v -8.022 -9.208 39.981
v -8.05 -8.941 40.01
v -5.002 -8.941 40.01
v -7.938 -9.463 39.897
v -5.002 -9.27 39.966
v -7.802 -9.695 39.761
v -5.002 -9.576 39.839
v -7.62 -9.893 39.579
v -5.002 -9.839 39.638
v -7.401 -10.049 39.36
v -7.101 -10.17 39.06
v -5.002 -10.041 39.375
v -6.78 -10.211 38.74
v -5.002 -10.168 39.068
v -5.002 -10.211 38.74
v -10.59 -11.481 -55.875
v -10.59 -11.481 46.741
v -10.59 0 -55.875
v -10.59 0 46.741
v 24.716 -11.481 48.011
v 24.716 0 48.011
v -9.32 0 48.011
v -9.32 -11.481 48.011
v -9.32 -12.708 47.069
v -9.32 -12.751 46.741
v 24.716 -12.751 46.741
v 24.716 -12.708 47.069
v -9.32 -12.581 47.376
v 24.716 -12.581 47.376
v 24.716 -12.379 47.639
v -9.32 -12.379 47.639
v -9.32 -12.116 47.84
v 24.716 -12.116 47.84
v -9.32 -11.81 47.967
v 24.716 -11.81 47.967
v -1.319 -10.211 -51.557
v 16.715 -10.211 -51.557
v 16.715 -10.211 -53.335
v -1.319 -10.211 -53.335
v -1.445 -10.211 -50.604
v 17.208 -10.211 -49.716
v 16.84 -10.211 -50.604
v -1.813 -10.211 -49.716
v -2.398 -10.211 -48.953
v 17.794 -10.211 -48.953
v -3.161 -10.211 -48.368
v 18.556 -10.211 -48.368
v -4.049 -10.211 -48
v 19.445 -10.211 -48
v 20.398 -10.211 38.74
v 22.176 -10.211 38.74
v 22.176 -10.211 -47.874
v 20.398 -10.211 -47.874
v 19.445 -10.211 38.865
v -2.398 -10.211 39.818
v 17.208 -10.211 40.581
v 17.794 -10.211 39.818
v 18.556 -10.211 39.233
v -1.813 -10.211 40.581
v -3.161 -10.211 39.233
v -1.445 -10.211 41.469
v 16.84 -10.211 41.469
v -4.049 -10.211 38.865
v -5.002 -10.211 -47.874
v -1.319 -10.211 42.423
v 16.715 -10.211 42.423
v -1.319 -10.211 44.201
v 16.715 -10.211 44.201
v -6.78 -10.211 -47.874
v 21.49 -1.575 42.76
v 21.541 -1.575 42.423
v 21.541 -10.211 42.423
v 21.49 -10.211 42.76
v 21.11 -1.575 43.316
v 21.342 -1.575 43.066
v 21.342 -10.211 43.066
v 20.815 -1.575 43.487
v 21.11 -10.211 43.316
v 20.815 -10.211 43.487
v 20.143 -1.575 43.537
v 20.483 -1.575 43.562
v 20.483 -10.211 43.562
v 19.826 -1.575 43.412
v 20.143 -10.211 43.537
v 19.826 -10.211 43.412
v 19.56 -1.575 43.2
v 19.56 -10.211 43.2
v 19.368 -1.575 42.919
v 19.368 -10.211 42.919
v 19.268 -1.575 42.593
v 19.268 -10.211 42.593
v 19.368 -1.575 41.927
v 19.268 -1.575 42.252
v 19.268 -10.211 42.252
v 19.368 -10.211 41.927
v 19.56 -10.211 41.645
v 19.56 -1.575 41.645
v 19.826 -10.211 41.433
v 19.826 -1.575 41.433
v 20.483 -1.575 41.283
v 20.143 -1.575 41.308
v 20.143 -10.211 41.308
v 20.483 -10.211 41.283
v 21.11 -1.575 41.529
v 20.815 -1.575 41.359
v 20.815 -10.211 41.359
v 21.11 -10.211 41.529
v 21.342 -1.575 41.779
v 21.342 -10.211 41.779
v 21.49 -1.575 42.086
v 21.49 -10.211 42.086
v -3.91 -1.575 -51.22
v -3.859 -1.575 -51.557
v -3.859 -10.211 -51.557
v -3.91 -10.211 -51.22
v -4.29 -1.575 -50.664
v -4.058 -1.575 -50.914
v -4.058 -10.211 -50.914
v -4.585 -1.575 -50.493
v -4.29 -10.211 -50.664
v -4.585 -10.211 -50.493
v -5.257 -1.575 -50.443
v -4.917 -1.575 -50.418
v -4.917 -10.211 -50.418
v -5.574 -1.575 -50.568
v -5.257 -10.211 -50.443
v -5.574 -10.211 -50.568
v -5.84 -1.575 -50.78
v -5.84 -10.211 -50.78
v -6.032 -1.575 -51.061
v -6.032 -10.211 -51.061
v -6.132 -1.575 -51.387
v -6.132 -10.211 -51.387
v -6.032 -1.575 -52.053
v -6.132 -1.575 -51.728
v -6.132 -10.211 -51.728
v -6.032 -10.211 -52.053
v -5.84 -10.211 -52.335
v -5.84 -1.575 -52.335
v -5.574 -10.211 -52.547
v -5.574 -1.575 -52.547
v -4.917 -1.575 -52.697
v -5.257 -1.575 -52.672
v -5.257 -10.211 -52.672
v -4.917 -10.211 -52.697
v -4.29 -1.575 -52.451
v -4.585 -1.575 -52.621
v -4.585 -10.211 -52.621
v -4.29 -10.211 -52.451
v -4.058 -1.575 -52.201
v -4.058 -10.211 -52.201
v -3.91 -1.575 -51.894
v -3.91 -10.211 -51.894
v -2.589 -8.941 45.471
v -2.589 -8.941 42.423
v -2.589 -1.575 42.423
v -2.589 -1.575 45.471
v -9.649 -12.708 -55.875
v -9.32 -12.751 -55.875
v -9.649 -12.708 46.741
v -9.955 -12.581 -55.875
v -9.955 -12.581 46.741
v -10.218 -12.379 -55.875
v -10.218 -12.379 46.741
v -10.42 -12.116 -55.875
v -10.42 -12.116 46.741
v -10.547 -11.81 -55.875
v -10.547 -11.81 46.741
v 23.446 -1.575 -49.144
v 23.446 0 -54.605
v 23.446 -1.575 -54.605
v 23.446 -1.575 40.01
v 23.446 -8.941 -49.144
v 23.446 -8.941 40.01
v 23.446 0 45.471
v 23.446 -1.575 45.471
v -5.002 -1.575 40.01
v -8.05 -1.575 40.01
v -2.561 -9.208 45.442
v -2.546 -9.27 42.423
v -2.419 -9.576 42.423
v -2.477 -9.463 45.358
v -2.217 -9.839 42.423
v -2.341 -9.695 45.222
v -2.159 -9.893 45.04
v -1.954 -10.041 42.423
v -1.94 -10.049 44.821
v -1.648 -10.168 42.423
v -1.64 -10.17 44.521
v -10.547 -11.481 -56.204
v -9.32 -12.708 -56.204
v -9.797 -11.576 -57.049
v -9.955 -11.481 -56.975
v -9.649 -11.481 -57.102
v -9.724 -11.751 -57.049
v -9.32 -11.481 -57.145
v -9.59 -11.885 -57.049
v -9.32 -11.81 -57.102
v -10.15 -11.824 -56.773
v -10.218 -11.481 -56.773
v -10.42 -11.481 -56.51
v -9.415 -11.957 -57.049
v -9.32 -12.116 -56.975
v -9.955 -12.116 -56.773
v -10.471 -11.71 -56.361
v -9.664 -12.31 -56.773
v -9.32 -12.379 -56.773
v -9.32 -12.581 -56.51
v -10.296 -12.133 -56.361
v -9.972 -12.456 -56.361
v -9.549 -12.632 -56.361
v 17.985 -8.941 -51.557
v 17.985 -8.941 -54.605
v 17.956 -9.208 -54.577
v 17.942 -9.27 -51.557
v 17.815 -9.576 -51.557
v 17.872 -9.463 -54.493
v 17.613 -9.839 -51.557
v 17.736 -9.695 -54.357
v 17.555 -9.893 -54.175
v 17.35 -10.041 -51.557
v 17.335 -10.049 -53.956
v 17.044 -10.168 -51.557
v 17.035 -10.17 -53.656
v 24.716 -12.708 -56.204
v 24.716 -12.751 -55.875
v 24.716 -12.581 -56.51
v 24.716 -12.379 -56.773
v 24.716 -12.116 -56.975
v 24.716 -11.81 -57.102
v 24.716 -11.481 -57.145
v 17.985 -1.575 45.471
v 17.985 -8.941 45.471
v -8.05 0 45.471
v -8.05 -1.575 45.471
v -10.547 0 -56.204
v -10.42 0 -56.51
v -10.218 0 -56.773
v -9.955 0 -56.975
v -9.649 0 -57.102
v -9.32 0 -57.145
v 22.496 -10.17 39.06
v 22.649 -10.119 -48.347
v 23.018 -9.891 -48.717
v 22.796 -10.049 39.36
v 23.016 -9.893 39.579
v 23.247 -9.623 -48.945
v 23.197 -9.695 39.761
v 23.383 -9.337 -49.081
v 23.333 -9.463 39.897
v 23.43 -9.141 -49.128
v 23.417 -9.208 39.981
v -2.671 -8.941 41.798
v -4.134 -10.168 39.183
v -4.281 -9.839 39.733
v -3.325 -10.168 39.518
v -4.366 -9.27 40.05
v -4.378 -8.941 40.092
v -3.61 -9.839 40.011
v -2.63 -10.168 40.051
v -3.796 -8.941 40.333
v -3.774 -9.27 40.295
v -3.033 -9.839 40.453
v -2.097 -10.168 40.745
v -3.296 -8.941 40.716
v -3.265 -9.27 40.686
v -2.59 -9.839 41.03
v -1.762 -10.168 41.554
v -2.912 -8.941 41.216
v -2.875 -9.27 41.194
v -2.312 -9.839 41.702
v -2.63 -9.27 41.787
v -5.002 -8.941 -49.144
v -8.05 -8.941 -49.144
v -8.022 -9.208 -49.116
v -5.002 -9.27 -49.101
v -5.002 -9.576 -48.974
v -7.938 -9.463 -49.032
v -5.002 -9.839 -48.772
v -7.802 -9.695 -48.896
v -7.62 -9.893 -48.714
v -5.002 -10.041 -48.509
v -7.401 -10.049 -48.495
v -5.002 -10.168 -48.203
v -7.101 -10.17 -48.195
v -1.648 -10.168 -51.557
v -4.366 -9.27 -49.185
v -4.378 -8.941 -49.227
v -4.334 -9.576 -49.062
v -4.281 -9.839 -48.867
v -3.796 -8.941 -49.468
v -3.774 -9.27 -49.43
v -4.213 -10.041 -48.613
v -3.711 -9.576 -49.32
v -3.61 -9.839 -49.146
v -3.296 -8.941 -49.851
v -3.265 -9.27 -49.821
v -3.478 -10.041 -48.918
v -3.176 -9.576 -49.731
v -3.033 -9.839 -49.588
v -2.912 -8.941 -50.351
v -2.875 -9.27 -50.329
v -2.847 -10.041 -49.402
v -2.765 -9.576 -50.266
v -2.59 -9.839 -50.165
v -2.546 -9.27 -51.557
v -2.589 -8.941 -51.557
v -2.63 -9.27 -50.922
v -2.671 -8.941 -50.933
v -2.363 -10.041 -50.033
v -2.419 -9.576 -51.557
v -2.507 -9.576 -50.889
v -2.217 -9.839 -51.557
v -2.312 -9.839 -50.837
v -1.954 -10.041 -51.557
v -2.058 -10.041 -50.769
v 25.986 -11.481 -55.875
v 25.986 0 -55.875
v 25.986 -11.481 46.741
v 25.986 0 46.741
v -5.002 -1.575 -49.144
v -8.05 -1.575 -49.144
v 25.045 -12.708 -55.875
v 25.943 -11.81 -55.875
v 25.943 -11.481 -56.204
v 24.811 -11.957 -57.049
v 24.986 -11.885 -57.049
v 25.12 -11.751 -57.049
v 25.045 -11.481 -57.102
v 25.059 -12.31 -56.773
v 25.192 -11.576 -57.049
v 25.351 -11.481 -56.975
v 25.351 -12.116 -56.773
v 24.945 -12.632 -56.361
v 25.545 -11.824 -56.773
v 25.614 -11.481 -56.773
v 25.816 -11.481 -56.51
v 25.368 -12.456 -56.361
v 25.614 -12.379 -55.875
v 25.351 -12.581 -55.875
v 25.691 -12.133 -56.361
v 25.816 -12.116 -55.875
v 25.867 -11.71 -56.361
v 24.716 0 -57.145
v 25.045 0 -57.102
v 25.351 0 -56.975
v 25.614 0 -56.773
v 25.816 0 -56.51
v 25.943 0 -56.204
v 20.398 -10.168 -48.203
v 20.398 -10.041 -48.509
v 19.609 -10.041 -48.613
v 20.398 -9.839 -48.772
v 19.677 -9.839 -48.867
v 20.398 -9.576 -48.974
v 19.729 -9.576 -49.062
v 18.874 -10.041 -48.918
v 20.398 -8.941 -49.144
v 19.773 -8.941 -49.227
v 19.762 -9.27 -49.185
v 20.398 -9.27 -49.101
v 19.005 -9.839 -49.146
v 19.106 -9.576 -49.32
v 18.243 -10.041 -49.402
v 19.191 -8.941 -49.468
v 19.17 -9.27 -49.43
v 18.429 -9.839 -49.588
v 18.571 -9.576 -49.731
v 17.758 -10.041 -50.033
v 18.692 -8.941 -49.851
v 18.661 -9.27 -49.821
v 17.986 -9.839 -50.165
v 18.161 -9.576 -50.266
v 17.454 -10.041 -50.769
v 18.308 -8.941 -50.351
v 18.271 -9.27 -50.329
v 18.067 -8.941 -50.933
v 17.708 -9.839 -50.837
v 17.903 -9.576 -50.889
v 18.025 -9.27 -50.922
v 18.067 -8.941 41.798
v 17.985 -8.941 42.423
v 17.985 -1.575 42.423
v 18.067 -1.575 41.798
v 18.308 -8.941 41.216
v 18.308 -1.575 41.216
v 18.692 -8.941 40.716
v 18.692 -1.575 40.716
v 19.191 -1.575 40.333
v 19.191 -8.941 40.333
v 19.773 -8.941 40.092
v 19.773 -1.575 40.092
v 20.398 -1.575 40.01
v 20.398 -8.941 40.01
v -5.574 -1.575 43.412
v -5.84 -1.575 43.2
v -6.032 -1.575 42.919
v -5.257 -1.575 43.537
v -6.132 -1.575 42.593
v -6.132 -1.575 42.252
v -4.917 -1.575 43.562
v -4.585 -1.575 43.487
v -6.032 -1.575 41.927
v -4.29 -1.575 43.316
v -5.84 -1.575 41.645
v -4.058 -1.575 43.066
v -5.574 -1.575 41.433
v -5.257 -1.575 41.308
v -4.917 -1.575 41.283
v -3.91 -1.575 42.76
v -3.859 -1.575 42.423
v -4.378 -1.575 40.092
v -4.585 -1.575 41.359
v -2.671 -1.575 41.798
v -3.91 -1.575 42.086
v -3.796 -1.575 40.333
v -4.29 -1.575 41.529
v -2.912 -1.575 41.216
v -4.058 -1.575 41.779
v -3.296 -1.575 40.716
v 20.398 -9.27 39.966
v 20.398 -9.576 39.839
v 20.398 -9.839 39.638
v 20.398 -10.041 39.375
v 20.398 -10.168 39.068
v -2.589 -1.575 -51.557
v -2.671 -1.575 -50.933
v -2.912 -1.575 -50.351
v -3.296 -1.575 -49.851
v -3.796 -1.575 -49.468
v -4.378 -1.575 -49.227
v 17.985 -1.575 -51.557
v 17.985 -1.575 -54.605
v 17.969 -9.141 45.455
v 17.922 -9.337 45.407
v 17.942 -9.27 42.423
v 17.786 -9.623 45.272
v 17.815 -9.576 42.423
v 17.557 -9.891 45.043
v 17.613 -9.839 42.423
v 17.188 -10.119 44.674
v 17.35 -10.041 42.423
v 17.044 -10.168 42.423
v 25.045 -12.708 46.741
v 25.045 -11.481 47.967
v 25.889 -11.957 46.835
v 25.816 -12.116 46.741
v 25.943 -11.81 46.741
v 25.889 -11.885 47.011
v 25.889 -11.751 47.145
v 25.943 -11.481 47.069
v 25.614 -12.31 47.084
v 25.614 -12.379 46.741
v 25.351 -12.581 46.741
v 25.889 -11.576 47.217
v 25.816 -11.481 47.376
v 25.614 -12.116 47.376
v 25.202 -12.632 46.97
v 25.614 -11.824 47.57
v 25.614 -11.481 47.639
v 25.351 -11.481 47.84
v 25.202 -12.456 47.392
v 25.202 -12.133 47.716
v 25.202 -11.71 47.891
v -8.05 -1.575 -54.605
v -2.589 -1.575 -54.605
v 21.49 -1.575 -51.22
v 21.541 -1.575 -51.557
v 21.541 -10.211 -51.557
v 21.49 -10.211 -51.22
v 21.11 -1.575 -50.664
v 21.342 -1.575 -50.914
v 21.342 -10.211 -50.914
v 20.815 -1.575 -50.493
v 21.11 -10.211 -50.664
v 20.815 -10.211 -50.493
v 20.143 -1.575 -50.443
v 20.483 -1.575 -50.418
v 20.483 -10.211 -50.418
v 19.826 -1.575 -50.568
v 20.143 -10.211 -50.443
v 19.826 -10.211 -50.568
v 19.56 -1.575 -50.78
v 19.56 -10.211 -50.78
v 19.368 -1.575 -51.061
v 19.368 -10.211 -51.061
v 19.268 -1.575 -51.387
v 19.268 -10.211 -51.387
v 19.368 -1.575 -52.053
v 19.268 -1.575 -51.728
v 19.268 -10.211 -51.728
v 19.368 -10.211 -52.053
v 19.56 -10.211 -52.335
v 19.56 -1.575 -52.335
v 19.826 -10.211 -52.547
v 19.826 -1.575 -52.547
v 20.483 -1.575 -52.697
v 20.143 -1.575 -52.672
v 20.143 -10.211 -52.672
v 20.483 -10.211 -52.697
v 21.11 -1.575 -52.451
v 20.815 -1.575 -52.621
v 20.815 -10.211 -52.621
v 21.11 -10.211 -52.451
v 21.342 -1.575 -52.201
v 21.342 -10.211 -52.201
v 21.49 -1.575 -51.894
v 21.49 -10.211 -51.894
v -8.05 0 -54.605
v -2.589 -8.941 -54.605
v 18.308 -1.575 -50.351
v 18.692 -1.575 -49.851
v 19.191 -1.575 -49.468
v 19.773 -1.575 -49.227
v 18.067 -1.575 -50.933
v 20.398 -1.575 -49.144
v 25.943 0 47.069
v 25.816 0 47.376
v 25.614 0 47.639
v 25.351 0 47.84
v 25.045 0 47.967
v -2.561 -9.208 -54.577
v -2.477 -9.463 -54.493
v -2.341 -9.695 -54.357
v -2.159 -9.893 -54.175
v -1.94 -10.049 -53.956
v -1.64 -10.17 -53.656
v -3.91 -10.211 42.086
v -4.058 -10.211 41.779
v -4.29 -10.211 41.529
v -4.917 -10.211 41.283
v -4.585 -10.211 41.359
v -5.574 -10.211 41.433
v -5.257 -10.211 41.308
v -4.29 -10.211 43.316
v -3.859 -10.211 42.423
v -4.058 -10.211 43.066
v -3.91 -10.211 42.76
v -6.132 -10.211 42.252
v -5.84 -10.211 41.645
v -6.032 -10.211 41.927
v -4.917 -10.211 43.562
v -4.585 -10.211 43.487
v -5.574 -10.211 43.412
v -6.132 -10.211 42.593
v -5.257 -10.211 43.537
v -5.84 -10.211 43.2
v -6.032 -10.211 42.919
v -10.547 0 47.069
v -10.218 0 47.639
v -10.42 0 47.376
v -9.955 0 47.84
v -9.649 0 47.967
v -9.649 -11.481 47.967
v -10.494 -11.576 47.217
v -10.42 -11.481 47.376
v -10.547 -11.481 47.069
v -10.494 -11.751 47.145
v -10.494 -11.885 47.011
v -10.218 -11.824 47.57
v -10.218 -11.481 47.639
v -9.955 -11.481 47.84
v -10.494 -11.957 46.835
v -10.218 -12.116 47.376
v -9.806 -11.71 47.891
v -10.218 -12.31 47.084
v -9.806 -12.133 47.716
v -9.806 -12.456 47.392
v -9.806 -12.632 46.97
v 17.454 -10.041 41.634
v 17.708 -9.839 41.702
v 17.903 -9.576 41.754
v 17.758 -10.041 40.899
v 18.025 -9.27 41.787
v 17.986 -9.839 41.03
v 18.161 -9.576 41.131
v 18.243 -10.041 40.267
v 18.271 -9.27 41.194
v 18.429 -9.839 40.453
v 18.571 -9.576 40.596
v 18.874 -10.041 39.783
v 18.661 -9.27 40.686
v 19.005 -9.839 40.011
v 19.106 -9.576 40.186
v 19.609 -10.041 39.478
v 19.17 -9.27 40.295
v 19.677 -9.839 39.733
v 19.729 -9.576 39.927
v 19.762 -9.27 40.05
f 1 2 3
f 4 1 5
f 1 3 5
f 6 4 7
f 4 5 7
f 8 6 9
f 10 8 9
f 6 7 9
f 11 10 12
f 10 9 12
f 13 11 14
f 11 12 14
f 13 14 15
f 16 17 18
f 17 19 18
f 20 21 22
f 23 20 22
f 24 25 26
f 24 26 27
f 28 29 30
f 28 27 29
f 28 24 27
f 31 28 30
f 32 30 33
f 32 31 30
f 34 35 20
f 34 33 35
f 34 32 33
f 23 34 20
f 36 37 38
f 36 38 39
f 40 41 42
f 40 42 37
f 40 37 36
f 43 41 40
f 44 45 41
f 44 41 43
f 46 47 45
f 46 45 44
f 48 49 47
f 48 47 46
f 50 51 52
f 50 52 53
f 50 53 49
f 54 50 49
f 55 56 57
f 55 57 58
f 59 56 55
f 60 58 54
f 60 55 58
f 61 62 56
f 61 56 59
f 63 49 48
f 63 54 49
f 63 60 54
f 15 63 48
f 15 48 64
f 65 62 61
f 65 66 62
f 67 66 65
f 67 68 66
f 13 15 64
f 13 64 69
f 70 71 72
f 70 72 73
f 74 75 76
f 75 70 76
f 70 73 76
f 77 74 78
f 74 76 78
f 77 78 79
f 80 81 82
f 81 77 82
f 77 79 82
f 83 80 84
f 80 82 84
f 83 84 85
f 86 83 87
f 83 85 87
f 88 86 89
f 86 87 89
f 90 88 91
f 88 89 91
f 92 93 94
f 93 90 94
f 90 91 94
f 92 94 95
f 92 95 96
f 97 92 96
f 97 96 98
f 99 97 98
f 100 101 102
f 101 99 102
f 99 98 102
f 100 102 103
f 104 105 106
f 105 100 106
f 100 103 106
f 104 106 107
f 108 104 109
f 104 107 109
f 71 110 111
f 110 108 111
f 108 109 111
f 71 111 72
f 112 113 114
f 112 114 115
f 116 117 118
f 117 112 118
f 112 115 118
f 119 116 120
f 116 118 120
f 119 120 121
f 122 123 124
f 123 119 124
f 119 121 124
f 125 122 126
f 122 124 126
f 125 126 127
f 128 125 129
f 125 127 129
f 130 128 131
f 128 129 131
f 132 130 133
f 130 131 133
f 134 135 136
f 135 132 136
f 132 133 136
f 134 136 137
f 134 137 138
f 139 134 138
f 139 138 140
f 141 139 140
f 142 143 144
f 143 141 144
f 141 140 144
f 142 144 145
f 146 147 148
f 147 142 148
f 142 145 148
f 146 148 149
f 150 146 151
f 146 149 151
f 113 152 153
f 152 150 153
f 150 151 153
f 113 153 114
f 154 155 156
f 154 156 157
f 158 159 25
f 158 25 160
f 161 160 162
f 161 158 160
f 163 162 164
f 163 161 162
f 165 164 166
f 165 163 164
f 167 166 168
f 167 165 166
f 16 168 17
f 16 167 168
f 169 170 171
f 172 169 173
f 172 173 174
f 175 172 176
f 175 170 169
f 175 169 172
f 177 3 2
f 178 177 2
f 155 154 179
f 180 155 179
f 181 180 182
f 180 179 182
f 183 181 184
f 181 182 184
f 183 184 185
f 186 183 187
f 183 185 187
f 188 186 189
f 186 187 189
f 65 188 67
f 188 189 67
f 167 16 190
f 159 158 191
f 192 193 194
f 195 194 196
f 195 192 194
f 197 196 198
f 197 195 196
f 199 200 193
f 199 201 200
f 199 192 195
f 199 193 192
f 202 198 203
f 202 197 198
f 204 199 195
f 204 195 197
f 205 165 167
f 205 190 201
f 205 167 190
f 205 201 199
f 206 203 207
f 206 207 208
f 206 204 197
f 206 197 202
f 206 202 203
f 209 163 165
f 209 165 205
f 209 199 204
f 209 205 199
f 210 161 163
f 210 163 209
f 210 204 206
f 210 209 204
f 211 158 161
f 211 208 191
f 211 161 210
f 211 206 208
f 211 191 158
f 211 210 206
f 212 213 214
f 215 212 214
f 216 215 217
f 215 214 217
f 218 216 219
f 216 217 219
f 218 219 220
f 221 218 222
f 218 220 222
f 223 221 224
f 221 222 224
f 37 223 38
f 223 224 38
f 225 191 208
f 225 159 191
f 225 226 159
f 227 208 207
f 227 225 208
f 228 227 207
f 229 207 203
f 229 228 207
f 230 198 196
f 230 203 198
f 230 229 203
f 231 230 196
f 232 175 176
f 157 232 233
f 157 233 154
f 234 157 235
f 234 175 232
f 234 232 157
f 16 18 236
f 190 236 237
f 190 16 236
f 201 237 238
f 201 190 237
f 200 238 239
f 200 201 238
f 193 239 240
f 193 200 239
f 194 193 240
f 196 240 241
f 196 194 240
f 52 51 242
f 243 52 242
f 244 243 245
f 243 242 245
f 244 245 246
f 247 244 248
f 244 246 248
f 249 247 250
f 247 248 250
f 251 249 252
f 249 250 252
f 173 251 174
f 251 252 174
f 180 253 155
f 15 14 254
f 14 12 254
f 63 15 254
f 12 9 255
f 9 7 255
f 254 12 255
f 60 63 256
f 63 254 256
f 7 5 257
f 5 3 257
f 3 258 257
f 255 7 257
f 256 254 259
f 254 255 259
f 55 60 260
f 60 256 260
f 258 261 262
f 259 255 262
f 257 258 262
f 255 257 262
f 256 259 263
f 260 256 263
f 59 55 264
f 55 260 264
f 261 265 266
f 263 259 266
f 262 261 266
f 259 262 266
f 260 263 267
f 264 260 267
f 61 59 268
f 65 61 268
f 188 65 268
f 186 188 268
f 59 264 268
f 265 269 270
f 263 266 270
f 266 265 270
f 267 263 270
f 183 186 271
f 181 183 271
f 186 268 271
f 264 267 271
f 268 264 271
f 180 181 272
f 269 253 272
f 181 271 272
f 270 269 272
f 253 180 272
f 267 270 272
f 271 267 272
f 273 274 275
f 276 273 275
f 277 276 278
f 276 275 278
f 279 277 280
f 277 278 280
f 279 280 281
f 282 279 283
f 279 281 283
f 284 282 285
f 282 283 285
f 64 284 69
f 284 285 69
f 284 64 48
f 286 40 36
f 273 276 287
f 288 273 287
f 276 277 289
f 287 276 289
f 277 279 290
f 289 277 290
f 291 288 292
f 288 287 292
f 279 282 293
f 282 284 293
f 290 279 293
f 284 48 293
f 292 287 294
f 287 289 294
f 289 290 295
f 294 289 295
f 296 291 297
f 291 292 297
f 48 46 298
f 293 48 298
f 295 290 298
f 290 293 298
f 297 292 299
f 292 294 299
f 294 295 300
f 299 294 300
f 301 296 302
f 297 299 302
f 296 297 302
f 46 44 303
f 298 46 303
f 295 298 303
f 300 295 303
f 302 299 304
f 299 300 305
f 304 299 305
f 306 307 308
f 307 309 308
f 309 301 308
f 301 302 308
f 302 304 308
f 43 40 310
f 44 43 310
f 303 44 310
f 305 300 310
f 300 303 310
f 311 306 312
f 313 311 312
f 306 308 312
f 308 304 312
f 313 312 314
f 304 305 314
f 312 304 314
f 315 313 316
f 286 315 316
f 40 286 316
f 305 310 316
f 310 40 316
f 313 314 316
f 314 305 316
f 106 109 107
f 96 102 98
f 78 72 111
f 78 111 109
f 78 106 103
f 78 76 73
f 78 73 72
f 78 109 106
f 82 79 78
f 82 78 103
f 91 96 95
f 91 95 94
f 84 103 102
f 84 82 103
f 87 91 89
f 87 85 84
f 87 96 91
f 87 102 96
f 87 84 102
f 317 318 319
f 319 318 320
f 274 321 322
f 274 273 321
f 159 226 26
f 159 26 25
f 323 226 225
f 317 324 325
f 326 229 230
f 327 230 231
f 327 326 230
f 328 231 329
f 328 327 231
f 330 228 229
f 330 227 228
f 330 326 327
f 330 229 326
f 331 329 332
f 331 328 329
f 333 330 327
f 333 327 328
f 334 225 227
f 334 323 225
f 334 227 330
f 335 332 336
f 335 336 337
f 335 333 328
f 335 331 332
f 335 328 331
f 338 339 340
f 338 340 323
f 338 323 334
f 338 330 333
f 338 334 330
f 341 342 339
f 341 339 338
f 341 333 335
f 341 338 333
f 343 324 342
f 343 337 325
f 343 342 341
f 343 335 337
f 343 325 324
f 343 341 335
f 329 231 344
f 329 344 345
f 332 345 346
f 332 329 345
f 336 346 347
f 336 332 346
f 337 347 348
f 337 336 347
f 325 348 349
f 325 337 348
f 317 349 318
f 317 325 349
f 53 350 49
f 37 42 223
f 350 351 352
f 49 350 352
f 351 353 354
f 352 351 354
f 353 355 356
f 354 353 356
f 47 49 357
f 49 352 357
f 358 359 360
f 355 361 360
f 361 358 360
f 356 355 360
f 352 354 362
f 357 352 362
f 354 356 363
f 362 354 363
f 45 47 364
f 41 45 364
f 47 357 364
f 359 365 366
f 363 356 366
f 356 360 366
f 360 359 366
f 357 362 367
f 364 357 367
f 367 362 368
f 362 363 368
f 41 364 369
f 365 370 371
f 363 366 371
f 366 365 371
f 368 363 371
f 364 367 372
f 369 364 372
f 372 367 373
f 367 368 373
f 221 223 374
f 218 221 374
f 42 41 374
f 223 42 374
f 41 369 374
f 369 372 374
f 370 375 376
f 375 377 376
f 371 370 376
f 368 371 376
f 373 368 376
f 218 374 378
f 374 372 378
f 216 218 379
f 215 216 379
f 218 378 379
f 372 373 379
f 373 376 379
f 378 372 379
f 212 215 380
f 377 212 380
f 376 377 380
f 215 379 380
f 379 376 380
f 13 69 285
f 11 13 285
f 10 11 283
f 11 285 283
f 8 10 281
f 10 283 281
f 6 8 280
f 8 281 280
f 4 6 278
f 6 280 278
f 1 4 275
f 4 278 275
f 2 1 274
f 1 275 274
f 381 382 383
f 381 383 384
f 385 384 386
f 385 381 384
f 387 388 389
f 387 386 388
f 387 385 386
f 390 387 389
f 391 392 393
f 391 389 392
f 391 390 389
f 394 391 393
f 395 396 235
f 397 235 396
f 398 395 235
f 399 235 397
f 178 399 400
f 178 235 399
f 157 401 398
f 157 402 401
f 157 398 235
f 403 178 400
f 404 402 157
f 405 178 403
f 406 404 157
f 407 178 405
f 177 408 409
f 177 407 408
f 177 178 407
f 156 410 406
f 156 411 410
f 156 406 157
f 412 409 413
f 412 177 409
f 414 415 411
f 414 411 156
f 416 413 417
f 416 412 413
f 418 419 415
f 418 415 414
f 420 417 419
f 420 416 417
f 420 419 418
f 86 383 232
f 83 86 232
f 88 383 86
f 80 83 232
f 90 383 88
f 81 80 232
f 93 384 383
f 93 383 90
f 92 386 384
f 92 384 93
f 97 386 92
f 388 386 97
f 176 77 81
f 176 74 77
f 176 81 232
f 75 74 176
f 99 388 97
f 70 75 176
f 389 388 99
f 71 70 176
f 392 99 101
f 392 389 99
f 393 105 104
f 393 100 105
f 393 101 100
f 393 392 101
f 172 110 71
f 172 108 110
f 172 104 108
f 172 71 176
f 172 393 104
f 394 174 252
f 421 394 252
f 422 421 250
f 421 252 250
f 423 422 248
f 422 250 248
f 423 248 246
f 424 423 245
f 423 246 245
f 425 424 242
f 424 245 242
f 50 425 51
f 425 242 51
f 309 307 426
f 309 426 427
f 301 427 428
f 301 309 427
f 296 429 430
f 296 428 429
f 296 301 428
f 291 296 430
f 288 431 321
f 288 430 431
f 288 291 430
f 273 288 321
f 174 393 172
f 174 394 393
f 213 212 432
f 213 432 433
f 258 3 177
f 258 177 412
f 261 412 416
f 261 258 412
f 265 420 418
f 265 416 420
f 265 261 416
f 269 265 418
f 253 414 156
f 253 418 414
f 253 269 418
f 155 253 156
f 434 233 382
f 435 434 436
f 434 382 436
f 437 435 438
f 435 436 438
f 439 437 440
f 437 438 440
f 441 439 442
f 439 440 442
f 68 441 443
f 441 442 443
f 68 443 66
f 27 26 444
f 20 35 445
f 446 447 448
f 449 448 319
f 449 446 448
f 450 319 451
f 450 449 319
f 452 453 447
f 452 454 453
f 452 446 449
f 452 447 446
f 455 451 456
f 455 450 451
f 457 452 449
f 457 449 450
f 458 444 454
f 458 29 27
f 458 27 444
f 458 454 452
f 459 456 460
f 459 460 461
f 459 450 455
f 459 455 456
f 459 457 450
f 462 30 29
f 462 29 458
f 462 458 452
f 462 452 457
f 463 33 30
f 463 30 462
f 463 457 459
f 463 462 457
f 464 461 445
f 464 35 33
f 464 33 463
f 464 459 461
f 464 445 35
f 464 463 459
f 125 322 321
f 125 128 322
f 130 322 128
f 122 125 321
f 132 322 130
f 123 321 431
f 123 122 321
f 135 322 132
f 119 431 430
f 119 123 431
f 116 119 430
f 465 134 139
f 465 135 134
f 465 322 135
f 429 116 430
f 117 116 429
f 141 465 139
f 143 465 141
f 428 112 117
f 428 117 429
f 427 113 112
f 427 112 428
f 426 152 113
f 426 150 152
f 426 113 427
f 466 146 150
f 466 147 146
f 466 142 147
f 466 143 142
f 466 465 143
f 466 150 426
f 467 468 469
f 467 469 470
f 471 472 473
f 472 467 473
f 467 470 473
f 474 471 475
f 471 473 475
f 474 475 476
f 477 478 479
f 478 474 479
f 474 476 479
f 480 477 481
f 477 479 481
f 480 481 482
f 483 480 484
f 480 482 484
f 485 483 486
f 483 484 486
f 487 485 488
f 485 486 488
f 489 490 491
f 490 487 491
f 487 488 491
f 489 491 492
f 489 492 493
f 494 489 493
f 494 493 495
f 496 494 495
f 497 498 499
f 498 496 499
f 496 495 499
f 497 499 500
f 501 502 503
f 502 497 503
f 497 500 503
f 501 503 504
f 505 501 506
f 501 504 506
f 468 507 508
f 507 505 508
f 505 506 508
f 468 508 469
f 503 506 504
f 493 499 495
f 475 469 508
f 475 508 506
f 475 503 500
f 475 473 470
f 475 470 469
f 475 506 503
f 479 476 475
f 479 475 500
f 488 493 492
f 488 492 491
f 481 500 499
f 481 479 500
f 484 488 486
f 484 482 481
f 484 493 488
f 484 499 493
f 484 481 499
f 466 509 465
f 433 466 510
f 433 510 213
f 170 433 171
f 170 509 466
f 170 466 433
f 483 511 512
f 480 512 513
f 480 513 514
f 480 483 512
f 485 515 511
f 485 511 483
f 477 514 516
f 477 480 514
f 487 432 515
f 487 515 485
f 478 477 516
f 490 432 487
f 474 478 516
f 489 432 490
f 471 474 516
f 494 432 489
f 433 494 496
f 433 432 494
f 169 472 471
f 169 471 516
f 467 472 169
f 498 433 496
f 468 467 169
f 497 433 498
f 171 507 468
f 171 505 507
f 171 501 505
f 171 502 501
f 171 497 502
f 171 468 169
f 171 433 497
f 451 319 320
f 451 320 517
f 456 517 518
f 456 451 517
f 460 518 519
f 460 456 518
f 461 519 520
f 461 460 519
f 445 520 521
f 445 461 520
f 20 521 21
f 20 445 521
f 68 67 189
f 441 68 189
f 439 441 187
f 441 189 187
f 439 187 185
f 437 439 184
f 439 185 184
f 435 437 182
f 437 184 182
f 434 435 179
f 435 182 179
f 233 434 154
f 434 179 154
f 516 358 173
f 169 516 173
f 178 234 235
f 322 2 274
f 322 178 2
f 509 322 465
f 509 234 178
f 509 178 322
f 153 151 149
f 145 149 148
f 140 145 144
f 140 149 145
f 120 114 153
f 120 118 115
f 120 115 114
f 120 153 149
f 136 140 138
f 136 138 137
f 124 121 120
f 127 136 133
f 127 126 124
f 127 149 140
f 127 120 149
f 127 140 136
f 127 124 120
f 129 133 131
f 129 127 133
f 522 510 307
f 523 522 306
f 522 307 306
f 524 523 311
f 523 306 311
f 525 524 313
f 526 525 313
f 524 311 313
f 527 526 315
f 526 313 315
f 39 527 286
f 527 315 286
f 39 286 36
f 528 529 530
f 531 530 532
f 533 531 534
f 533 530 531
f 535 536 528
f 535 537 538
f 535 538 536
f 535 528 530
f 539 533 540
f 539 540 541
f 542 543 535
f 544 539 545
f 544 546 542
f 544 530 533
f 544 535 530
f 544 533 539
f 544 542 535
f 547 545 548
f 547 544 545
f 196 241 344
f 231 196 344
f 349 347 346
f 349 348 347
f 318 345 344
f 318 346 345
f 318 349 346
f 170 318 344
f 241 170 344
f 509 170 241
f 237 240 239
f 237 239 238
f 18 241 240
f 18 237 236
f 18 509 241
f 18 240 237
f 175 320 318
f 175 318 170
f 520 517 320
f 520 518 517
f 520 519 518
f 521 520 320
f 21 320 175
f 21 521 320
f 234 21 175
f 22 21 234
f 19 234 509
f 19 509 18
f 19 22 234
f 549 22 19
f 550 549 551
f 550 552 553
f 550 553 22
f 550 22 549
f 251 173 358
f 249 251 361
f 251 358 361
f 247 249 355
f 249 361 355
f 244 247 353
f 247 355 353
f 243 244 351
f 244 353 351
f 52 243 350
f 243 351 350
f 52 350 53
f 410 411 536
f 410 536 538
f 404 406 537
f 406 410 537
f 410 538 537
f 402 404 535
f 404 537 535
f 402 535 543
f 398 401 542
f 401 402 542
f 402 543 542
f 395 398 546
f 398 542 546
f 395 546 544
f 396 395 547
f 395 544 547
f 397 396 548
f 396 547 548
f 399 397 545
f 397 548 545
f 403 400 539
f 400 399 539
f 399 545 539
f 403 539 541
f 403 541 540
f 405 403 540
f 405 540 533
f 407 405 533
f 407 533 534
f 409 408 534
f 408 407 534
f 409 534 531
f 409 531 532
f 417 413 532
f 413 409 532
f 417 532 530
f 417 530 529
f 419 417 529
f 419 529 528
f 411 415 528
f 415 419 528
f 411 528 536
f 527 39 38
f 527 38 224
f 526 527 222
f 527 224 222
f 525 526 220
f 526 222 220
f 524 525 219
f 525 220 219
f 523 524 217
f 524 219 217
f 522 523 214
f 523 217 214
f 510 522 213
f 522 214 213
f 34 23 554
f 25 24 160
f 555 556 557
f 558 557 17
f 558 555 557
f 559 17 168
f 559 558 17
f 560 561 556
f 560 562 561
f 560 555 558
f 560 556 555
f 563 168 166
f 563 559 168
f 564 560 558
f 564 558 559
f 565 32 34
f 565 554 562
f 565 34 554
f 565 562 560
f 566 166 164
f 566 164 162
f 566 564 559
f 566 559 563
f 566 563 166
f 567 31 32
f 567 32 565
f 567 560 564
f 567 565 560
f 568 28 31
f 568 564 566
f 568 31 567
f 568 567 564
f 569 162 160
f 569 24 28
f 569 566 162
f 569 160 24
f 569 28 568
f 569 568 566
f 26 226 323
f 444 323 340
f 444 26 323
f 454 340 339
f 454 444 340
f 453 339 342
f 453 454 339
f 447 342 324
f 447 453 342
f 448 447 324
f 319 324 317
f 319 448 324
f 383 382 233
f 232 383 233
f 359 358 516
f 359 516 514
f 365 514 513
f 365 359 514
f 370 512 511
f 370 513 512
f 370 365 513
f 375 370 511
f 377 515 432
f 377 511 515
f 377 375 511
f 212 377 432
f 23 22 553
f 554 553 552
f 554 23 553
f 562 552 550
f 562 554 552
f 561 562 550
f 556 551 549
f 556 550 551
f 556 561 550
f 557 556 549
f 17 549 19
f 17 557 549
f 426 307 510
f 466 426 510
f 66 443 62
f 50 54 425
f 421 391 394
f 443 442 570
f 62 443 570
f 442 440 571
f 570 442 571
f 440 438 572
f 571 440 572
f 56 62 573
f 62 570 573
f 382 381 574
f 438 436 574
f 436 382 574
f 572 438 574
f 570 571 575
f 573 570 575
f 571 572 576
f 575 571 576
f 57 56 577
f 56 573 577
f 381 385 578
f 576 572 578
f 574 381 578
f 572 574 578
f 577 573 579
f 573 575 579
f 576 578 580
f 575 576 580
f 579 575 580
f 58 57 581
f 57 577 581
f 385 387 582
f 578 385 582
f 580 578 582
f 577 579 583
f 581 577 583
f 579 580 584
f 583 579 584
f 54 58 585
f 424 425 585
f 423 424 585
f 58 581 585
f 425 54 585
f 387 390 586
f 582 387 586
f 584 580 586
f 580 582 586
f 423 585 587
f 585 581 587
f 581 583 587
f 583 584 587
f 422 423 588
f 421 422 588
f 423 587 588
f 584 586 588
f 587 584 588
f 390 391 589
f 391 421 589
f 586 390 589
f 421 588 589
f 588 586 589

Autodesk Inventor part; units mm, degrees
ref_plane "YZ Plane" through (0, 0, 0) normal (1, 0, 0) x (0, 1, 0)
ref_plane "XZ Plane" through (0, 0, 0) normal (0, 1, 0) x (-1, 0, 0)
ref_plane "XY Plane" through (0, 0, 0) normal (0, 0, 1) x (1, 0, 0)
sketch "Sketch1" plane through (0, 0, 0) normal (0, 1, 0) x (-1, 0, 0)
  line L0 (8.0502, -54.6054) -> (-23.4458, -54.6054)
  line L1 (-23.4458, -54.6054) -> (-23.4458, 45.4706)
  line L2 (-23.4458, 45.4706) -> (8.0502, 45.4706)
  line L3 (8.0502, 45.4706) -> (8.0502, -54.6054)
  line L4 (10.5902, -57.1454) -> (-25.9858, -57.1454)
  line L5 (-25.9858, -57.1454) -> (-25.9858, 48.0106)
  line L6 (-25.9858, 48.0106) -> (10.5902, 48.0106)
  line L7 (10.5902, 48.0106) -> (10.5902, -57.1454)
  point P0 (0, 0)
  point P1 (-7.6978, -57.1454)
  dimension "d0" = 100.076
  dimension "d1" = 31.496
  dimension "d2" = 2.54
  dimension "d3" = 2.54
  dimension "d4" = 2.54
  dimension "d5" = 2.54
extrude "Extrusion1" add sketch "Sketch1" against normal blind 12.7508 contours L0 L1 L2 L3 | L4 L5 L6 L7
extrude "Extrusion2" cut sketch "Sketch1" against normal blind 10.2108 contours L0 L1 L2 L3
sketch "Sketch2" plane through (0, -10.2108, 0) normal (0, 1, 0) x (1, 0, 0)
  circle A0 centre (-5.0022, -42.4226) radius 1.143
  line L0 (-8.0502, -45.4706) -> (-8.0502, 54.6054) projected
  line L1 (23.4458, -45.4706) -> (-8.0502, -45.4706) projected
  arc A1 (-2.5892, -42.4226) -> (-5.0022, -40.0096) centre (-5.0022, -42.4226) ccw
  line L2 (-5.0022, -40.0096) -> (-8.0502, -40.0096)
  line L3 (-2.5892, -42.4226) -> (-2.5892, -45.4706)
  line L4 (23.4458, -45.4706) -> (-8.0502, -45.4706) projected
  line L5 (-8.0502, -45.4706) -> (-2.5892, -45.4706)
  line L6 (-8.0502, -40.0096) -> (-8.0502, -45.4706)
  line L7 (23.4458, 54.6054) -> (23.4458, -45.4706) projected
  line L8 (-8.0502, 54.6054) -> (23.4458, 54.6054) projected
  line L9 (-8.0502, 4.5674) -> (30.3732, 4.5674)
  line L10 (7.6978, -45.4706) -> (7.6978, 57.2864)
  circle A2 centre (20.3978, -42.4226) radius 1.143
  line L11 (23.4458, -45.4706) -> (23.4458, 54.6054)
  line L12 (-8.0502, -45.4706) -> (23.4458, -45.4706)
  arc A3 (20.3978, -40.0096) -> (17.9848, -42.4226) centre (20.3978, -42.4226) ccw
  line L13 (20.3978, -40.0096) -> (23.4458, -40.0096)
  line L14 (17.9848, -42.4226) -> (17.9848, -45.4706)
  line L15 (-8.0502, -45.4706) -> (23.4458, -45.4706)
  line L16 (23.4458, -40.0096) -> (23.4458, -45.4706)
  circle A4 centre (-5.0022, 51.5574) radius 1.143
  line L17 (23.4458, 54.6054) -> (-8.0502, 54.6054)
  arc A5 (-5.0022, 49.1444) -> (-2.5892, 51.5574) centre (-5.0022, 51.5574) ccw
  line L18 (-5.0022, 49.1444) -> (-8.0502, 49.1444)
  line L19 (-2.5892, 51.5574) -> (-2.5892, 54.6054)
  line L20 (23.4458, 54.6054) -> (-8.0502, 54.6054)
  line L21 (-8.0502, 54.6054) -> (-2.5892, 54.6054)
  line L22 (-8.0502, 49.1444) -> (-8.0502, 54.6054)
  circle A6 centre (20.3978, 51.5574) radius 1.143
  arc A7 (17.9848, 51.5574) -> (20.3978, 49.1444) centre (20.3978, 51.5574) ccw
  line L23 (17.9848, 51.5574) -> (17.9848, 54.6054)
  line L24 (-8.0502, 54.6054) -> (23.4458, 54.6054)
  line L25 (20.3978, 49.1444) -> (23.4458, 49.1444)
  line L26 (-8.0502, 54.6054) -> (23.4458, 54.6054)
  line L27 (23.4458, 49.1444) -> (23.4458, 54.6054)
  point P0 (0, 0)
  point P1 (7.6978, 54.6054)
  dimension "d10" = 2.286
  dimension "d11" = 3.048
  dimension "d12" = 3.048
  dimension "d13" = 4.826
extrude "Extrusion3" add sketch "Sketch2" along normal blind 8.636 contours L0 L2 A1 L3 L1 | L0 L8 L19 A5 L18 | L14 A3 L13 L7 L1 | L25 A7 L23 L8 L7
fillet "Fillet1" radius 1.27 8 edges at (7.6978, -12.7508, 48.0106) (25.9858, -6.3754, 48.0106) (25.9858, -12.7508, -4.5674) (25.9858, -6.3754, -57.1454) (-10.5902, -6.3754, 48.0106) (-10.5902, -12.7508, -4.5674) (-10.5902, -6.3754, -57.1454) (7.6978, -12.7508, -57.1454)
fillet "Fillet2" radius 1.27 16 edges at (-8.0502, -10.2108, -4.5674) (7.6978, -10.2108, -54.6054) (-6.5262, -10.2108, -49.1444) (-2.5892, -10.2108, -53.0814) (-3.296, -10.2108, -49.8511) (17.9848, -10.2108, -53.0814) (21.9218, -10.2108, -49.1444) (18.6915, -10.2108, -49.8511) (23.4458, -10.2108, -4.5674) (21.9218, -10.2108, 40.0096) (17.9848, -10.2108, 43.9466) (18.6915, -10.2108, 40.7164) (7.6978, -10.2108, 45.4706) (-2.5892, -10.2108, 43.9466) (-6.5262, -10.2108, 40.0096) (-3.296, -10.2108, 40.7164)
properties part number "CaseBottom"
